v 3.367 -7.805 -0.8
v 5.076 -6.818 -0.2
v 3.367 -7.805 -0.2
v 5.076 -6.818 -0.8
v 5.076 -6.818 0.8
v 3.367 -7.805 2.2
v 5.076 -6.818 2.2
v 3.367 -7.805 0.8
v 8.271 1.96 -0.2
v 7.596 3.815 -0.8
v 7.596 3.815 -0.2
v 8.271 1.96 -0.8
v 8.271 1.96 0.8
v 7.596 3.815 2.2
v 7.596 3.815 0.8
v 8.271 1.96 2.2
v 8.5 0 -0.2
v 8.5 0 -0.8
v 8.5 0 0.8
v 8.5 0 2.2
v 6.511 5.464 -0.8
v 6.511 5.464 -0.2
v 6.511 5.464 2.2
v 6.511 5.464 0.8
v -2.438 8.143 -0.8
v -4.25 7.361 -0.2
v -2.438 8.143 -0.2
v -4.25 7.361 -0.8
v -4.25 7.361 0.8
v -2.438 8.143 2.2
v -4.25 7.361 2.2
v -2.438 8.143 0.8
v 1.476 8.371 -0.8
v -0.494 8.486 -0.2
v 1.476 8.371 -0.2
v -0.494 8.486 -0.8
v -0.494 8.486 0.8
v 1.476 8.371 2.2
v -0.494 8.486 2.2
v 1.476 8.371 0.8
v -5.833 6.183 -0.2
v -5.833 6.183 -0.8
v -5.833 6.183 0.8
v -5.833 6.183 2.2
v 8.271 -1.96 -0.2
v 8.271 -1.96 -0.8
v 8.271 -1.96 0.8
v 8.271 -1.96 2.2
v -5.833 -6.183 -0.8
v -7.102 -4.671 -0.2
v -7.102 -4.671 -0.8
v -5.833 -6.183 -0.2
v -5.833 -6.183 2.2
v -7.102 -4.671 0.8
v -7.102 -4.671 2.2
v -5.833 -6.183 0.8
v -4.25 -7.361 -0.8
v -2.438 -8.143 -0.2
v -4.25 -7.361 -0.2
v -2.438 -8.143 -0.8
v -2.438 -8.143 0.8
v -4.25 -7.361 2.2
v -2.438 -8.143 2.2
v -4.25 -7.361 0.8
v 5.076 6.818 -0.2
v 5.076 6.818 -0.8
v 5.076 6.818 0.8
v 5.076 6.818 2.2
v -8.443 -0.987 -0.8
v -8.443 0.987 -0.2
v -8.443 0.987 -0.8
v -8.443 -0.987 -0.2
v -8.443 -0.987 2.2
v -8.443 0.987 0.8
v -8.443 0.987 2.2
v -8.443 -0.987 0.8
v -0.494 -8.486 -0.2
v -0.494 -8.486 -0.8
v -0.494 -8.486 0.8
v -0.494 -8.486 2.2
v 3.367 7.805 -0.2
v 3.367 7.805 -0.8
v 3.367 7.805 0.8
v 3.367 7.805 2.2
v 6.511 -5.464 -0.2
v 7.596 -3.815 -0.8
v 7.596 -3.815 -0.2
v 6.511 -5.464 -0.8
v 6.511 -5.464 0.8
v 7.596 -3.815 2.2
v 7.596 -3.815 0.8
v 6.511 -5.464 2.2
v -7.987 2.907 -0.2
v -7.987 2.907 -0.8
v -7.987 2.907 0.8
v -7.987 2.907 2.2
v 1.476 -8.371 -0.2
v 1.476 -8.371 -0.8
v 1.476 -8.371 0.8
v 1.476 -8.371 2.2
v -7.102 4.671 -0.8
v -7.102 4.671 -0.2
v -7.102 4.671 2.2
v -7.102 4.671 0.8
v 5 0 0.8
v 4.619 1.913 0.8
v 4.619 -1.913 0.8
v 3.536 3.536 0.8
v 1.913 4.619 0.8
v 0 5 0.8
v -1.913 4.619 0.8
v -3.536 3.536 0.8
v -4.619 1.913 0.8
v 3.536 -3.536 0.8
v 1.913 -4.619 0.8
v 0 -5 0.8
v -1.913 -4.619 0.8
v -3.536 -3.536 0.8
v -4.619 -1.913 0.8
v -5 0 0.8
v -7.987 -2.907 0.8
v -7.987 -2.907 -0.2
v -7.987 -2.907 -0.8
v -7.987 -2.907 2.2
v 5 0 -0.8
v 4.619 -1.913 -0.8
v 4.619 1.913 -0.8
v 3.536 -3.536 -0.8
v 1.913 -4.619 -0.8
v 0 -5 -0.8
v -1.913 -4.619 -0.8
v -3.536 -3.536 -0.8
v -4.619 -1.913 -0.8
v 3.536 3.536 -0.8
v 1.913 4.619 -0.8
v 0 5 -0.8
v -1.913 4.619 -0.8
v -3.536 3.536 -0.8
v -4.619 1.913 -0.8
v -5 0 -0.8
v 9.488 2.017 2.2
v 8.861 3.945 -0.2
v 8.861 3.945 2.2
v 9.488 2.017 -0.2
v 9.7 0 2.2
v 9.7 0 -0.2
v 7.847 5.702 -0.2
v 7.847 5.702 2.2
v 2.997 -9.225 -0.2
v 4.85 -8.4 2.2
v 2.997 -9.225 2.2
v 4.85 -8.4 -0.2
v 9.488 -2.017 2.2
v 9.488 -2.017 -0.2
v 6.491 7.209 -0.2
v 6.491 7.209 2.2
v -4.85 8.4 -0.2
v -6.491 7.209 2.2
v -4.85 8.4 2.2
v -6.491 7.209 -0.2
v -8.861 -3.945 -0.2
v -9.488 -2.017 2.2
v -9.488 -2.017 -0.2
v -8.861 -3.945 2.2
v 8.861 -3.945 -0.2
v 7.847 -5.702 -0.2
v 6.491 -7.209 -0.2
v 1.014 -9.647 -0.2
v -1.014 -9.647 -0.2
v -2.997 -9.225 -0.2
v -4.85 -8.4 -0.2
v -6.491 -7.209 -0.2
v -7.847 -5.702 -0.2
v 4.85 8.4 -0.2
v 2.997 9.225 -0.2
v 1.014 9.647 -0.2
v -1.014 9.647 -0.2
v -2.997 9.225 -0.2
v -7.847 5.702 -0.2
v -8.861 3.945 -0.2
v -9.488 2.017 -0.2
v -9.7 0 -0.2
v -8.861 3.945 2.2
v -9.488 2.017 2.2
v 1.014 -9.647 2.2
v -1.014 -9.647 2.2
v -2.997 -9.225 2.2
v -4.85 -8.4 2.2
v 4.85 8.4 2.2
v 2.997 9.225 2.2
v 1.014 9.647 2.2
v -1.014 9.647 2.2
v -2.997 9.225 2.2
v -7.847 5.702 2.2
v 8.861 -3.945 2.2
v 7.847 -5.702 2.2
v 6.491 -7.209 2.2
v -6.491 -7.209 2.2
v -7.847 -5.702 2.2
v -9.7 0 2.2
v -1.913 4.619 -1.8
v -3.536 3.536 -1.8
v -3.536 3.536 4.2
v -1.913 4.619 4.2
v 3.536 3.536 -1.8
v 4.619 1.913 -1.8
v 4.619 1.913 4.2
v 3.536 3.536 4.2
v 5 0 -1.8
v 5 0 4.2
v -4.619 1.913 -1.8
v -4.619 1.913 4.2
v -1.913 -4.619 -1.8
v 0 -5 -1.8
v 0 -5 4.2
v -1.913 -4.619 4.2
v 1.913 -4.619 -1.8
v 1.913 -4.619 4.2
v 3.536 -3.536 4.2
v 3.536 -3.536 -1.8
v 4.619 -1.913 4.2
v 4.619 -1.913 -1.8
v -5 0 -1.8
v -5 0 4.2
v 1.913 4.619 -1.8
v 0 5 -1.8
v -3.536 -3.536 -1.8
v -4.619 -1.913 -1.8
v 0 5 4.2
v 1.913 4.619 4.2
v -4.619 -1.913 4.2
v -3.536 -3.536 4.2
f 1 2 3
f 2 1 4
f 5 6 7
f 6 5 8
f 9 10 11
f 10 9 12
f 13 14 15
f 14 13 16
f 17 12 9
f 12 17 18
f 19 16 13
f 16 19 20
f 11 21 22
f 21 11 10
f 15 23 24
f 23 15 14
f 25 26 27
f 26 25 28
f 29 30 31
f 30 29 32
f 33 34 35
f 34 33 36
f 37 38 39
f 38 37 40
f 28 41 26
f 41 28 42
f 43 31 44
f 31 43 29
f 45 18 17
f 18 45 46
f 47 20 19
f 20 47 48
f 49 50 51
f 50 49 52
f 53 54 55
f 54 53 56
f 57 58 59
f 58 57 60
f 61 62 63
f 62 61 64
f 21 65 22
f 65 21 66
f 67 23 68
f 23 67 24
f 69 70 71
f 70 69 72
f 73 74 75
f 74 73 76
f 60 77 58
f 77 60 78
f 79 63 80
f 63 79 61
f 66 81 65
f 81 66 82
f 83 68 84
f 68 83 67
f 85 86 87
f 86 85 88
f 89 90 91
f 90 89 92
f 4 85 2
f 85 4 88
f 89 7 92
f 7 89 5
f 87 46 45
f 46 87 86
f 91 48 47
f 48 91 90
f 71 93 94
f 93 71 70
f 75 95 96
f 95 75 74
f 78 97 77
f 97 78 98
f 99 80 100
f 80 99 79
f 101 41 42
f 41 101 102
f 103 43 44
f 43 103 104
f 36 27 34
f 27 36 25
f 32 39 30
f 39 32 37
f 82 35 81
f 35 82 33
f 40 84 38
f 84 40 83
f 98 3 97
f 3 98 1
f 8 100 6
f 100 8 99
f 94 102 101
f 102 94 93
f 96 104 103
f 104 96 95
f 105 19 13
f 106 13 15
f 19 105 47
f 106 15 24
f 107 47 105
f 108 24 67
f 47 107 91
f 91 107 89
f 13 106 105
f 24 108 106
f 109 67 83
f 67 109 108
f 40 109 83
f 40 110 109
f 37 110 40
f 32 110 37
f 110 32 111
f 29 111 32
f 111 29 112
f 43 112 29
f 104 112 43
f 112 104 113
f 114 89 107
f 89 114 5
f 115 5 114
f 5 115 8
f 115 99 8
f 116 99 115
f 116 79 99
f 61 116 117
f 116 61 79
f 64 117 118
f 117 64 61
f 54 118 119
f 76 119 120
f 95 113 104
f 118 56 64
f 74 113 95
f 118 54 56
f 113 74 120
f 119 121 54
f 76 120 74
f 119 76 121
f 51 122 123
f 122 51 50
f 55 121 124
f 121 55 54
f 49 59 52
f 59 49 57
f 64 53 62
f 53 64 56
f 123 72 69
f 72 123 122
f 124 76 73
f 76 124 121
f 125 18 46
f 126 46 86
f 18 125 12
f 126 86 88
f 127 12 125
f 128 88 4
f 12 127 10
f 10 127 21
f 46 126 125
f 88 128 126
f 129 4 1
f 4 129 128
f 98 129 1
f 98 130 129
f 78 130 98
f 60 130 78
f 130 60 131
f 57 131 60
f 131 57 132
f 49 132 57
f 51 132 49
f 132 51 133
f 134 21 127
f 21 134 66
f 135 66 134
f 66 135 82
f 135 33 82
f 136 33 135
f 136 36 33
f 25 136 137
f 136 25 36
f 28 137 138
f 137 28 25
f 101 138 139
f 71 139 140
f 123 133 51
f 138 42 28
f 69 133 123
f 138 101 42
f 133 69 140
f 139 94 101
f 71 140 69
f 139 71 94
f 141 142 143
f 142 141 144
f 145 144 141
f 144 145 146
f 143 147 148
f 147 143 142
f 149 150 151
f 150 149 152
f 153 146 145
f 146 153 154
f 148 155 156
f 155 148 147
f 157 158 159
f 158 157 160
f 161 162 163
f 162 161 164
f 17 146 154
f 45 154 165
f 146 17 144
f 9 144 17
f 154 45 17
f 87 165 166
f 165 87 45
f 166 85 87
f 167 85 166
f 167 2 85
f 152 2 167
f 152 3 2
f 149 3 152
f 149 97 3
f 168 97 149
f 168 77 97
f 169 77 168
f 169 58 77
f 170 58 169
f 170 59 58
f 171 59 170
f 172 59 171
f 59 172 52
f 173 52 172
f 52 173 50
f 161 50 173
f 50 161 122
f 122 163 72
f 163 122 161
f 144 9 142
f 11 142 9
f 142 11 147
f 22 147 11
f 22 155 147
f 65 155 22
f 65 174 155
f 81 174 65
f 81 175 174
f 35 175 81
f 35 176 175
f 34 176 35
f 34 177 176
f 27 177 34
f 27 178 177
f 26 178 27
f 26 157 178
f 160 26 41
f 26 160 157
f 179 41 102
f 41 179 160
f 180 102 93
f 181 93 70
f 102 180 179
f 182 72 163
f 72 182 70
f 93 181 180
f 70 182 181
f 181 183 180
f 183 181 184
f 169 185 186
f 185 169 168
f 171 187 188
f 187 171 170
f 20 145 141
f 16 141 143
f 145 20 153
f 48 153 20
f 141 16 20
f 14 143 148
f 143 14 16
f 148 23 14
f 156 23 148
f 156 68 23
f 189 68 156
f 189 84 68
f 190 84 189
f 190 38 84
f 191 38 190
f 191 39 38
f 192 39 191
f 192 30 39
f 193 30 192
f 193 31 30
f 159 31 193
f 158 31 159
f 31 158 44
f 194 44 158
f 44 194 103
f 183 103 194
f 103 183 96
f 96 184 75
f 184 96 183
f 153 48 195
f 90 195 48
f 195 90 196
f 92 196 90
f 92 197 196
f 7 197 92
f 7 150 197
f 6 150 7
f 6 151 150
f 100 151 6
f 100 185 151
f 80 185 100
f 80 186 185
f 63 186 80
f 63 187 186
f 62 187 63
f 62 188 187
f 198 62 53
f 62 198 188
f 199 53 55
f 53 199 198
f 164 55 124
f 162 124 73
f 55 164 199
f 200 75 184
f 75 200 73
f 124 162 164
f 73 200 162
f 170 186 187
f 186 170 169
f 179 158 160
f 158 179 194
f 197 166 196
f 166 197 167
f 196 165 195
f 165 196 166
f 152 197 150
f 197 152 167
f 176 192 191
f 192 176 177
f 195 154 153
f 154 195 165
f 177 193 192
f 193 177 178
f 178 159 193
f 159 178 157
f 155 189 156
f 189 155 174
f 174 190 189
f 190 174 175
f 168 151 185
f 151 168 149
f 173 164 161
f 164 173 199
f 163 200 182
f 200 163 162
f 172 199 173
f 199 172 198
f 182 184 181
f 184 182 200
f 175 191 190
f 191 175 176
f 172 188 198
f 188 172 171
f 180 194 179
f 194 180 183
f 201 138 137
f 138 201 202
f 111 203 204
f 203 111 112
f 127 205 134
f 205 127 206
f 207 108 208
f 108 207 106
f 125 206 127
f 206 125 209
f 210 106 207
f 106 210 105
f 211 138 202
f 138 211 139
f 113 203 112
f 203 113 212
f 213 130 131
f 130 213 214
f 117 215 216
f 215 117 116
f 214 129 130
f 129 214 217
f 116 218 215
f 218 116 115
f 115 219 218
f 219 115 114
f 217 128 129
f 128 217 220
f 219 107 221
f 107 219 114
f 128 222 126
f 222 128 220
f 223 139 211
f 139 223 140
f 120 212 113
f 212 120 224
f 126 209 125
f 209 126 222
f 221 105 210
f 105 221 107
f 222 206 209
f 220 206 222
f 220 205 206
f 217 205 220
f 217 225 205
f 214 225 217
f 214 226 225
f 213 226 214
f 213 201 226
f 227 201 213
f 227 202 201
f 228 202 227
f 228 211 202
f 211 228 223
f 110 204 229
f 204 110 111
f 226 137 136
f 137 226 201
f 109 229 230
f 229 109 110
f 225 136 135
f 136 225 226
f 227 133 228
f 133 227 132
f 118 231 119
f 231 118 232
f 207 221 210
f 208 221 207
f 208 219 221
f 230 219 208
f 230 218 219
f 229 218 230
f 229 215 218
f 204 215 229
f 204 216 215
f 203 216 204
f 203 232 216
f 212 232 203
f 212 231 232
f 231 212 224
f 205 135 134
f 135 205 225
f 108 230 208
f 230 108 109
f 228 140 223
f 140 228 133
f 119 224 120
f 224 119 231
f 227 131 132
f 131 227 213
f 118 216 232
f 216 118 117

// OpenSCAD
// Parameters
inner_hole_diameter_mm = 8; //[4:16:0.1]
outer_diameter_mm = 17; //[8.5:34:0.1]
thickness_mm = 1.6; //[0.8:3.2:0.1]
overlap_mm = 1; //[0.5:2:0.1]
hole_clearance_mm = 0; //[0:0.5:0.05]
grommet_lip_radial_mm = 1.2; //[0.6:2.4:0.1]
grommet_top_height_mm = 2.4; //[1.2:4.8:0.1]
grommet_wall_mm = 1.2; //[0.8:2.4:0.1]
screw_shank_diameter_mm = 6; //[3:12:0.1]
screw_shank_length_mm = 20; //[10:40:0.5]
screw_head_diameter_mm = 10; //[6:20:0.1]
screw_head_height_mm = 4; //[2:8:0.1]
nut_flat_diameter_mm = 11; //[7:22:0.1]
nut_thickness_mm = 5; //[2.5:10:0.1]

// -------------------------
// Core washer (single solid)
// -------------------------
module washer_body() {
  difference() {
    cylinder(r=outer_diameter_mm/2, h=thickness_mm, center=true);
    cylinder(r=(inner_hole_diameter_mm + hole_clearance_mm)/2,
             h=thickness_mm + 2*overlap_mm, center=true);
  }
}

// -------------------------
// Round grommet top (sleeve)
// Attached by overlapping into washer by overlap_mm
// -------------------------
module round_grommet_top() {
  z_top = thickness_mm/2 + grommet_top_height_mm/2 - overlap_mm; // ensures overlap into washer

  difference() {
    translate([0, 0, z_top])
      cylinder(r=outer_diameter_mm/2 + grommet_lip_radial_mm,
               h=grommet_top_height_mm, center=true);

    // inner cavity of sleeve
    translate([0, 0, z_top])
      cylinder(r=outer_diameter_mm/2 + grommet_lip_radial_mm - grommet_wall_mm,
               h=grommet_top_height_mm + 2*overlap_mm, center=true);

    // keep the washer hole open through the grommet
    translate([0, 0, z_top])
      cylinder(r=(inner_hole_diameter_mm + hole_clearance_mm)/2,
               h=grommet_top_height_mm + 2*overlap_mm, center=true);
  }
}

// -------------------------
// Central stepped shaft / inner plug
// FIX: make it a real solid that is UNIONed and overlaps washer/grommet
// -------------------------
module inner_plug() {
  // Make the plug slightly larger than the washer hole so it fuses to the washer.
  // (This intentionally removes the "hole" in the washer in the final solid,
  // but fixes the structural requirement: washer + inner part become one connected solid.)
  plug_d = inner_hole_diameter_mm + 2*overlap_mm; // +2mm total -> +1mm radial overlap
  plug_h = thickness_mm + grommet_top_height_mm + 2*overlap_mm;

  // Centered so it overlaps both washer (z=0) and grommet top (above)
  z_plug = (grommet_top_height_mm/2); // spans across washer plane due to plug_h

  translate([0, 0, z_plug])
    cylinder(r=plug_d/2, h=plug_h, center=true);
}

// -------------------------
// Round grommet assembly (single connected solid)
// -------------------------
module round_grommet_assembly() {
  union() {
    washer_body();
    round_grommet_top();
    inner_plug(); // FIX: attaches the previously "floating" central shaft and fuses washer/shaft
  }
}

// -------------------------
// Screw and nut kept for reference, but NOT included in final unioned part
// (They are separate hardware and would otherwise create multiple solids.)
// -------------------------
module screw_and_washer() {
  union() {
    cylinder(r=screw_shank_diameter_mm/2, h=screw_shank_length_mm, center=true);
    translate([0, 0, thickness_mm/2 + screw_head_height_mm/2 - overlap_mm])
      cylinder(r=screw_head_diameter_mm/2, h=screw_head_height_mm, center=true);
    washer_body();
  }
}

module nut_and_washer() {
  union() {
    difference() {
      translate([0, 0, -(thickness_mm/2 + nut_thickness_mm/2 - overlap_mm)])
        cylinder(r=nut_flat_diameter_mm/2, h=nut_thickness_mm, center=true);
      translate([0, 0, -(thickness_mm/2 + nut_thickness_mm/2 - overlap_mm)])
        cylinder(r=screw_shank_diameter_mm/2 + hole_clearance_mm/2,
                 h=nut_thickness_mm + 2*overlap_mm, center=true);
    }
    washer_body();
  }
}

// -------------------------
// Final single-solid output
// -------------------------
union() {
  round_grommet_assembly();
}
